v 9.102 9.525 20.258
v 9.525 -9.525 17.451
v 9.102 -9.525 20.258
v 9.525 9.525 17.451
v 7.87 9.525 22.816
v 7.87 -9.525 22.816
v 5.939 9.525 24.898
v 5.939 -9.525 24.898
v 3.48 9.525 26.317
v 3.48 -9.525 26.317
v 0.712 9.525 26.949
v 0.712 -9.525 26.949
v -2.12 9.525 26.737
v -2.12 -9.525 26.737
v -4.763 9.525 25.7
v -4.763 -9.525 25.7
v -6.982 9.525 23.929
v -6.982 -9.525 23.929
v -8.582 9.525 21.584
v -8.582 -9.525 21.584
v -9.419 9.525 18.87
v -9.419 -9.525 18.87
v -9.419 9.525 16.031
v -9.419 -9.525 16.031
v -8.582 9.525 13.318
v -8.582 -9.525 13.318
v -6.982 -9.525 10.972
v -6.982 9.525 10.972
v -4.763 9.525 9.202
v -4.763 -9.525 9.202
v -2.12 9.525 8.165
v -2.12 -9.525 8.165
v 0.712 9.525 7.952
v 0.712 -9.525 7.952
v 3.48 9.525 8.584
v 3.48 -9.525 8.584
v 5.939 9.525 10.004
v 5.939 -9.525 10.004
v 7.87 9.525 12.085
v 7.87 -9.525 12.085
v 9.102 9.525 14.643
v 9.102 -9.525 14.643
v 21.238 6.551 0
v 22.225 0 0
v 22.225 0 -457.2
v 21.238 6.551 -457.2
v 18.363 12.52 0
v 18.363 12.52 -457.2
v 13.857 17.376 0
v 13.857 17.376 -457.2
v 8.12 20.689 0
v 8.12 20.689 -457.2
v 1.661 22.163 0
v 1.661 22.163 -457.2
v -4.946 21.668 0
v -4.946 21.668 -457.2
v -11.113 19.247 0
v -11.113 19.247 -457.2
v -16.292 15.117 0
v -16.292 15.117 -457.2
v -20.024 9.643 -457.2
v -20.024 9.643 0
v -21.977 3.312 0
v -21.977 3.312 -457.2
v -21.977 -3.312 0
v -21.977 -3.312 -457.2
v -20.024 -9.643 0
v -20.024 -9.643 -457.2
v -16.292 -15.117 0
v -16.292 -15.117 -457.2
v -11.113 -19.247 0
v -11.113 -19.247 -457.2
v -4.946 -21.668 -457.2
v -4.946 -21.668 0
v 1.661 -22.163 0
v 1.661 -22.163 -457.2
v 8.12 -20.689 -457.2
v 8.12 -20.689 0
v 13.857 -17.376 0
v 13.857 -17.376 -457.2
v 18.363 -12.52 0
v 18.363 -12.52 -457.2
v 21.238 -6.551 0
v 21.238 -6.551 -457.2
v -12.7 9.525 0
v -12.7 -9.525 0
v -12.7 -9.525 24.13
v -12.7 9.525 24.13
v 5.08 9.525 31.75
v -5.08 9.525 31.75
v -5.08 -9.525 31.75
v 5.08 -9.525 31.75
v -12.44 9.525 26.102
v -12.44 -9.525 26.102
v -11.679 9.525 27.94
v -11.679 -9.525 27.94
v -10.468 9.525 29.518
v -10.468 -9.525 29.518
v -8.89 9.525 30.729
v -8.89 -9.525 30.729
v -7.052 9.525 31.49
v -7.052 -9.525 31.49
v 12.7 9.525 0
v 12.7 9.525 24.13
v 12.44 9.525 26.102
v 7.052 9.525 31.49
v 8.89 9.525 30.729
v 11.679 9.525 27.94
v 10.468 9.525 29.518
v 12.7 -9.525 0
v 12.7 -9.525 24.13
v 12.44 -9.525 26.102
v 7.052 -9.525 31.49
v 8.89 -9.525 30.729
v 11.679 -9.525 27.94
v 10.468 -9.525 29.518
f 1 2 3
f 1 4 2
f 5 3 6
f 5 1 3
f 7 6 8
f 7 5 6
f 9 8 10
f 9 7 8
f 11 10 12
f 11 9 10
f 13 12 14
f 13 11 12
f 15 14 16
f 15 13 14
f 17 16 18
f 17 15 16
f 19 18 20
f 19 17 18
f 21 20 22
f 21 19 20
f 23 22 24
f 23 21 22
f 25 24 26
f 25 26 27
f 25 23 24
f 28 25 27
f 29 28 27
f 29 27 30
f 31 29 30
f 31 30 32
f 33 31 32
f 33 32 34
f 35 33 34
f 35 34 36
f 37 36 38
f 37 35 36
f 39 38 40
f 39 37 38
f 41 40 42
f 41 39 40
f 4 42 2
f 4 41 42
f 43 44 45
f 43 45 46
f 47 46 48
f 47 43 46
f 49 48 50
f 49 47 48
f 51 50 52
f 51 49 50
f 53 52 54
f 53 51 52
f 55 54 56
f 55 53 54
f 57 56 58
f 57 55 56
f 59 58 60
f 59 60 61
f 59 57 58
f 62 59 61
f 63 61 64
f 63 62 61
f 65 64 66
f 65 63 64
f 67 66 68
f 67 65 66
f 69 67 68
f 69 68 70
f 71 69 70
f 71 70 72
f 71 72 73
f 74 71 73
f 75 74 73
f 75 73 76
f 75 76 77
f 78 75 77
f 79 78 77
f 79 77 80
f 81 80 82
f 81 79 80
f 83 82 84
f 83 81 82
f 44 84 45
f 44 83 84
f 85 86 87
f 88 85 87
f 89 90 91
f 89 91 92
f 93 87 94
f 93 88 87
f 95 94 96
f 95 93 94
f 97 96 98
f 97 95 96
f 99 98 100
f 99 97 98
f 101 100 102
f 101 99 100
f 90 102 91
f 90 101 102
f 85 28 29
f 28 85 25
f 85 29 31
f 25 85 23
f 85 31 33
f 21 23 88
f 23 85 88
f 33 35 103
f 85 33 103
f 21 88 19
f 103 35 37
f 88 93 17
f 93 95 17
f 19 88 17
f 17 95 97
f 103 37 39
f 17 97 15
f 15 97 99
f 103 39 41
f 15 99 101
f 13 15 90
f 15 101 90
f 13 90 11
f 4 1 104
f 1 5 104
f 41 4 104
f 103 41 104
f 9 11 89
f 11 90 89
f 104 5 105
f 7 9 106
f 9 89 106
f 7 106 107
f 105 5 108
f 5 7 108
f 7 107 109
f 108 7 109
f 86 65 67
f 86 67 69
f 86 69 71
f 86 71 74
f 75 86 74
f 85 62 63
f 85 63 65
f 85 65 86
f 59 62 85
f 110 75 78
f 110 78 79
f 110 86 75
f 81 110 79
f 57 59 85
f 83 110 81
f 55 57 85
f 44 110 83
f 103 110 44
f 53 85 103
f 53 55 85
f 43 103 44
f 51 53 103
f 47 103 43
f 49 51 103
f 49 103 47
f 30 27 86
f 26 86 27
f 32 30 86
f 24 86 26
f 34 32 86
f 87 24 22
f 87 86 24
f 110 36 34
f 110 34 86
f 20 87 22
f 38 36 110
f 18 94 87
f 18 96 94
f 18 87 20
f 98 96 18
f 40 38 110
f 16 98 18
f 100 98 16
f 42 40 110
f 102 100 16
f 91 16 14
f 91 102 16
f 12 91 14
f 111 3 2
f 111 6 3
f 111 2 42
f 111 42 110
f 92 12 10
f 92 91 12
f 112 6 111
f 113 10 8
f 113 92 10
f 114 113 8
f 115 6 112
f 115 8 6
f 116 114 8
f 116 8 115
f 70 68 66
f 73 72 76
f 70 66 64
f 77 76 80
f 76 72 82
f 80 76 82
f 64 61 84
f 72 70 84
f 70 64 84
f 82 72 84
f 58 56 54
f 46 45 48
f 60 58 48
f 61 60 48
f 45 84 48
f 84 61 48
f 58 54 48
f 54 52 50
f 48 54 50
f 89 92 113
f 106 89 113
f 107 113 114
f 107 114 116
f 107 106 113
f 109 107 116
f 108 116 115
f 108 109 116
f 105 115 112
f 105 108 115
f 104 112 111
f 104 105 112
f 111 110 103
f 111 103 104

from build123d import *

# Parameters (mm, degrees)
F0_R     = 22.225
F1_DEPTH = 457.2
F2_W     = 25.4
F2_H     = 63.5
F2_R     = 9.525
F3_DEPTH = 9.525
F4_R     = 7.62


with BuildPart() as f1:
    # F0 (on Top) → F1 (new body)
    with BuildSketch(Plane.XY):
        Circle(F0_R)
    extrude(amount=-F1_DEPTH)

    # F2 (on Front) → F3 (join, symmetric)
    with BuildSketch(Plane.XZ):
        Rectangle(F2_W, F2_H)
        with Locations((0, 17.4507647753)):
            Circle(F2_R, mode=Mode.SUBTRACT)
    extrude(amount=F3_DEPTH, both=True)

    # F4
    f4_edges = [f1.edges().sort_by_distance(p)[0] for p in [
        (12.7, 0, 31.75),
        (-12.7, 0, 31.75),
    ]]
    fillet(f4_edges, radius=F4_R)


solid = f1.part
